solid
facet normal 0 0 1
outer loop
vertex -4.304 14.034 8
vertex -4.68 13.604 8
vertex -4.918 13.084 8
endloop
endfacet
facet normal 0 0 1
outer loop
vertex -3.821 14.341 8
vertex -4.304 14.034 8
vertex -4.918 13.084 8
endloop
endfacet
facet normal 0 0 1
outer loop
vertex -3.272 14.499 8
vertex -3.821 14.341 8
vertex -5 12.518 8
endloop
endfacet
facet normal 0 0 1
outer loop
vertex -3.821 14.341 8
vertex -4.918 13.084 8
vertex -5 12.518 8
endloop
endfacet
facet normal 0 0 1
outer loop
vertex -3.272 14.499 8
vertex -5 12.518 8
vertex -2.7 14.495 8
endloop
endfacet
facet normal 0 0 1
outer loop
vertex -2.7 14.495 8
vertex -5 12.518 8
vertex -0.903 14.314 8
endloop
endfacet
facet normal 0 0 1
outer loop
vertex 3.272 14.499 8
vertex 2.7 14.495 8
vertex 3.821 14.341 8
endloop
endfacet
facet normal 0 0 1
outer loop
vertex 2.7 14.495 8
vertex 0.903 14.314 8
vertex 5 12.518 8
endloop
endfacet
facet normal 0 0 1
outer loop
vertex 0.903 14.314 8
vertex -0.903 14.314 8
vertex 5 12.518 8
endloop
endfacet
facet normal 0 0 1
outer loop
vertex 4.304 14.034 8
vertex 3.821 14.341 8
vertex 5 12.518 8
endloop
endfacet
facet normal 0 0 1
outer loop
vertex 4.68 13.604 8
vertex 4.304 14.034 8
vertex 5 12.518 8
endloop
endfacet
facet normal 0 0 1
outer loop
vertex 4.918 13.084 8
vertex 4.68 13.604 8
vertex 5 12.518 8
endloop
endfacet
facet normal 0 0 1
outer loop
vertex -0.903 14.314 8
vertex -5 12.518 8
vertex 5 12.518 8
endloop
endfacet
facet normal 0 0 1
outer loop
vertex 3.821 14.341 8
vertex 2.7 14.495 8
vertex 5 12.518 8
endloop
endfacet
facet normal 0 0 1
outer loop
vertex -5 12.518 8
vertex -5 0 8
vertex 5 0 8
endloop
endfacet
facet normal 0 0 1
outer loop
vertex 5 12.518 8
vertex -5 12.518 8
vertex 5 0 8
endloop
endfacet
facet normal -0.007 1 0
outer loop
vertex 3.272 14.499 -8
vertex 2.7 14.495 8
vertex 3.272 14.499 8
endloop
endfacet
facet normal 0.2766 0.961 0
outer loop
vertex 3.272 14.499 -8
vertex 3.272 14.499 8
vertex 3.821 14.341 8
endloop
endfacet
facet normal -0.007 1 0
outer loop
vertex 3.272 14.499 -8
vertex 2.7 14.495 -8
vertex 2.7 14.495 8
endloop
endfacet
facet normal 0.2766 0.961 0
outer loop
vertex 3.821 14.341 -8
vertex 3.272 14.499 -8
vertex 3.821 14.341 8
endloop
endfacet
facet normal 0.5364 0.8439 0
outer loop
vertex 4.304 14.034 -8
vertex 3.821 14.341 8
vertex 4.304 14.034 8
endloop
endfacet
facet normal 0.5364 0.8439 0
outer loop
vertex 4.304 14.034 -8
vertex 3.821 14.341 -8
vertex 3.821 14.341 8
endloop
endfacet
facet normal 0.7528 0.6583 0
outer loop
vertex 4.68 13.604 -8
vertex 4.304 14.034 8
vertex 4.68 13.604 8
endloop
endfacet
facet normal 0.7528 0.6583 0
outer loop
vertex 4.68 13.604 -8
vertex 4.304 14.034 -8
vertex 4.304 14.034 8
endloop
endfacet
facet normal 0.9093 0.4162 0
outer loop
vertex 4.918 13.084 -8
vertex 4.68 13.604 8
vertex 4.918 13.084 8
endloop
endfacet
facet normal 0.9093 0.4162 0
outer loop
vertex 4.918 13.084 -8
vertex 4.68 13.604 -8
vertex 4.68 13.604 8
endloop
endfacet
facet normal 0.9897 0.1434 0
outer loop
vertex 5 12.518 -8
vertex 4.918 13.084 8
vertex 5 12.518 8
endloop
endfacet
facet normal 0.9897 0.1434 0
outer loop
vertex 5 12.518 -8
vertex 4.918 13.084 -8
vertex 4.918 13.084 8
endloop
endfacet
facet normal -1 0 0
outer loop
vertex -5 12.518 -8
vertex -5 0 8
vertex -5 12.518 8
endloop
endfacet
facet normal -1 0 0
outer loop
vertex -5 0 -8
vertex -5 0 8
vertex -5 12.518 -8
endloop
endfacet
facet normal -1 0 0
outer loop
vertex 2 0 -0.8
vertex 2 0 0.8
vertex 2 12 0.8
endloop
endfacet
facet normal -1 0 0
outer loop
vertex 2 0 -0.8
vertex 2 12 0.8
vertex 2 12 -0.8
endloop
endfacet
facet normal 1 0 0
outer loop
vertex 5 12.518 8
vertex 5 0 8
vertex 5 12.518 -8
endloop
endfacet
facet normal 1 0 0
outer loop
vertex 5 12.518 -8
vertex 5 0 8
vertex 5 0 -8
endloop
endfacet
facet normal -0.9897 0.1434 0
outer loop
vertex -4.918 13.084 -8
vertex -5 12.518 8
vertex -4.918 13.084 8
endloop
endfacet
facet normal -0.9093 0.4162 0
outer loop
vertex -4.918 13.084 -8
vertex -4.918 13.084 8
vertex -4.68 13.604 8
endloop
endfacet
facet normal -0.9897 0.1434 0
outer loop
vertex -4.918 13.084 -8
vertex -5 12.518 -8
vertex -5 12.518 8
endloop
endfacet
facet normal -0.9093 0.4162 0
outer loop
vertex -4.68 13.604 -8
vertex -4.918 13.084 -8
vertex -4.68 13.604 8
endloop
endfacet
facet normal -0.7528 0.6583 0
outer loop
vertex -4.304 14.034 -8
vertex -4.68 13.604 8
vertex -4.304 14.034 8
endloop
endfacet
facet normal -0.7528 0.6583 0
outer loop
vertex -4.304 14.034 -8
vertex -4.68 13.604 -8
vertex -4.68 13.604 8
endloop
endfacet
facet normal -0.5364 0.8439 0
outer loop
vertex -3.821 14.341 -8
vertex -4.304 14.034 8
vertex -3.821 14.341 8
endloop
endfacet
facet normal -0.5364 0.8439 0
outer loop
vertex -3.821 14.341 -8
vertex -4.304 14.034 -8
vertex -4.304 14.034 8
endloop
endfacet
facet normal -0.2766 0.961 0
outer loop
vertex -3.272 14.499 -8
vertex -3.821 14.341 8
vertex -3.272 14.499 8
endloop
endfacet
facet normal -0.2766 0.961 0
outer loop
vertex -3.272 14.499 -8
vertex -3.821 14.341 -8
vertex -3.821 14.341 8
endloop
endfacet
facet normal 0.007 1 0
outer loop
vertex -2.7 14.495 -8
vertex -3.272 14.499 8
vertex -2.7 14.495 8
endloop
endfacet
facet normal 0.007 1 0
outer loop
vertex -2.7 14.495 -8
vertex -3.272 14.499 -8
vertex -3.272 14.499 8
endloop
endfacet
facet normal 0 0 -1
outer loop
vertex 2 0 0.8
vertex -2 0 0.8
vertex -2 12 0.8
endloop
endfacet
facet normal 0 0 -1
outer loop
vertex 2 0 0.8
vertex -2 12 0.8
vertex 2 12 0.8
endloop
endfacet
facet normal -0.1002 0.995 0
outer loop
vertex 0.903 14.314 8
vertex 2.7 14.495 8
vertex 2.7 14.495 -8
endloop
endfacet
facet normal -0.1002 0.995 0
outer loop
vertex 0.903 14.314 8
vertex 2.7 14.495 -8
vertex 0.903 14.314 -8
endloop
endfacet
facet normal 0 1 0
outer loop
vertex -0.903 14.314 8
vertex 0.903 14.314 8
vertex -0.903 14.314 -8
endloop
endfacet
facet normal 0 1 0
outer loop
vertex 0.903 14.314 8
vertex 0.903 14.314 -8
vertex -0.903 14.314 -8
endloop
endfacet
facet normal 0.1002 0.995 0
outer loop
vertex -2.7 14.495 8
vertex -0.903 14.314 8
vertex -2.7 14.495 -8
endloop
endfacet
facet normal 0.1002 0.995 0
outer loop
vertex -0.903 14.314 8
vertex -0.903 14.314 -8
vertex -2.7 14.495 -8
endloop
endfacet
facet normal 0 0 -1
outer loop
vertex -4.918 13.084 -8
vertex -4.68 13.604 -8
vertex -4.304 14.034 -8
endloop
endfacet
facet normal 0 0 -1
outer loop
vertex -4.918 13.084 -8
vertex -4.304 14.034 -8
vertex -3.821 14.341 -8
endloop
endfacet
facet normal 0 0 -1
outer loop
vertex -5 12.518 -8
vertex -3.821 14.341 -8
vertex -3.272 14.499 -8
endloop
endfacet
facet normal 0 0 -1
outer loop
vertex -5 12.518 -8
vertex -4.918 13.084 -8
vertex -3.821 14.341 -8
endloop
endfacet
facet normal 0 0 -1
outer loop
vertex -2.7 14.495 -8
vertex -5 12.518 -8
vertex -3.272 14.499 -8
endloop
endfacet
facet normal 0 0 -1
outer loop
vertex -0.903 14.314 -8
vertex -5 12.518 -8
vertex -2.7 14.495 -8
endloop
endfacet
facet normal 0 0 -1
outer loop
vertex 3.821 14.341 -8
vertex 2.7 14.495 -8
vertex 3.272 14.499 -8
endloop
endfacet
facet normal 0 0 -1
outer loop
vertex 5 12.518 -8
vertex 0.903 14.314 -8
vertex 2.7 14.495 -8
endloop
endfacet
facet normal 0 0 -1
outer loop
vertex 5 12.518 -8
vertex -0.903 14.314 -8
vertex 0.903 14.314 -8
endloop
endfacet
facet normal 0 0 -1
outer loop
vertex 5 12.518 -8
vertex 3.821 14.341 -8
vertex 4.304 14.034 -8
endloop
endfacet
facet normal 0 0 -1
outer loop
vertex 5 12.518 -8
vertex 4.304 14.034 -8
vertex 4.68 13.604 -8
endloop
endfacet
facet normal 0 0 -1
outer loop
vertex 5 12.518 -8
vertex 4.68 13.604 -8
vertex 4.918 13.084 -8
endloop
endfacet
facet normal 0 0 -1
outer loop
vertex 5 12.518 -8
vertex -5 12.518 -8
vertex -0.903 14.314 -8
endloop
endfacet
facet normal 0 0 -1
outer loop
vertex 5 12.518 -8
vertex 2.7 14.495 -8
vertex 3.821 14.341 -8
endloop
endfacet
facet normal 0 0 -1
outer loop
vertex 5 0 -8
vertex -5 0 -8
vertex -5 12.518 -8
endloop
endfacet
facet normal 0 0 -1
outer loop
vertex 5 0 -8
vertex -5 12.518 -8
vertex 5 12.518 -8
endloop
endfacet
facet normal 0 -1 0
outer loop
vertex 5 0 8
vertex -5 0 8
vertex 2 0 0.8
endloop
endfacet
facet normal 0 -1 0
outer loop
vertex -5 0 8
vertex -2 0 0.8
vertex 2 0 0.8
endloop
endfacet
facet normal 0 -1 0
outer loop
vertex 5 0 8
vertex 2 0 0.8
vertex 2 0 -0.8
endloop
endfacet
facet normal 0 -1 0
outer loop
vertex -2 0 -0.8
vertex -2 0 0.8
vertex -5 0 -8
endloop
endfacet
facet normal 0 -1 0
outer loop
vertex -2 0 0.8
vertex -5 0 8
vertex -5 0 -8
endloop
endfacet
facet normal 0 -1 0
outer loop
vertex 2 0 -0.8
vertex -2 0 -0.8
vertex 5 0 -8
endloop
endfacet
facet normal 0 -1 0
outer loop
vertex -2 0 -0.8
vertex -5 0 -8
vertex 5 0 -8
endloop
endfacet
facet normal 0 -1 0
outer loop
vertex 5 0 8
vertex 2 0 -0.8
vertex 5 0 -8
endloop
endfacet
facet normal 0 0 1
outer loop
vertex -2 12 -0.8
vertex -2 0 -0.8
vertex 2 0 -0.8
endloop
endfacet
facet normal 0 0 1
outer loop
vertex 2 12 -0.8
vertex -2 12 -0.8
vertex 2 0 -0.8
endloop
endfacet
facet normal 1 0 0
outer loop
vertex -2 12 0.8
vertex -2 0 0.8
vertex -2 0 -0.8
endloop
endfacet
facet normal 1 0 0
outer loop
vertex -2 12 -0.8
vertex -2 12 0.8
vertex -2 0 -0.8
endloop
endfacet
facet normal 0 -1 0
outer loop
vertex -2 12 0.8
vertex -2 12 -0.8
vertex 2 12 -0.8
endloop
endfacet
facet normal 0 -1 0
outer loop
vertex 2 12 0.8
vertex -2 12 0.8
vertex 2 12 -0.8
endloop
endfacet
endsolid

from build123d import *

# Parameters (mm, degrees)
SKETCH2_W           = 10
SKETCH2_H           = 16
BOSS_EXTRUDE1_DEPTH = 15
CUT_EXTRUDE1_DEPTH  = 23.494443758
FILLET1_R           = 2
SKETCH1_W           = 4
SKETCH1_H           = 1.6
CUT_EXTRUDE3_DEPTH  = 12


with BuildPart() as part:
    # Sketch2 → Boss-Extrude1 (new body)
    with BuildSketch(Plane(origin=(0, 0, 0), x_dir=(1, 0, 0), z_dir=(0, 1, 0))):
        Rectangle(SKETCH2_W, SKETCH2_H)
    extrude(amount=BOSS_EXTRUDE1_DEPTH)

    # Sketch4 → Cut-Extrude1 (cut, through all)
    with BuildSketch(Plane(origin=(0, 0, -8), x_dir=(-1, 0, 0), z_dir=(0, 0, -1))):
        with BuildLine():
            Line((5, 15), (-5, 15))
            ThreePointArc((-5, 15), (0, 14.291616466), (5, 15))
        make_face()
    extrude(amount=-CUT_EXTRUDE1_DEPTH, mode=Mode.SUBTRACT)

    # Fillet1
    fillet1_edges = [part.edges().sort_by_distance(p)[0] for p in [
        (5, 15, 0),
        (-5, 15, 0),
    ]]
    fillet(fillet1_edges, radius=FILLET1_R)

    # Sketch1 → Cut-Extrude3 (cut)
    with BuildSketch(Plane(origin=(0, 0, 0), x_dir=(1, 0, 0), z_dir=(0, 1, 0))):
        Rectangle(SKETCH1_W, SKETCH1_H)
    extrude(amount=CUT_EXTRUDE3_DEPTH, mode=Mode.SUBTRACT)


solid = part.part
